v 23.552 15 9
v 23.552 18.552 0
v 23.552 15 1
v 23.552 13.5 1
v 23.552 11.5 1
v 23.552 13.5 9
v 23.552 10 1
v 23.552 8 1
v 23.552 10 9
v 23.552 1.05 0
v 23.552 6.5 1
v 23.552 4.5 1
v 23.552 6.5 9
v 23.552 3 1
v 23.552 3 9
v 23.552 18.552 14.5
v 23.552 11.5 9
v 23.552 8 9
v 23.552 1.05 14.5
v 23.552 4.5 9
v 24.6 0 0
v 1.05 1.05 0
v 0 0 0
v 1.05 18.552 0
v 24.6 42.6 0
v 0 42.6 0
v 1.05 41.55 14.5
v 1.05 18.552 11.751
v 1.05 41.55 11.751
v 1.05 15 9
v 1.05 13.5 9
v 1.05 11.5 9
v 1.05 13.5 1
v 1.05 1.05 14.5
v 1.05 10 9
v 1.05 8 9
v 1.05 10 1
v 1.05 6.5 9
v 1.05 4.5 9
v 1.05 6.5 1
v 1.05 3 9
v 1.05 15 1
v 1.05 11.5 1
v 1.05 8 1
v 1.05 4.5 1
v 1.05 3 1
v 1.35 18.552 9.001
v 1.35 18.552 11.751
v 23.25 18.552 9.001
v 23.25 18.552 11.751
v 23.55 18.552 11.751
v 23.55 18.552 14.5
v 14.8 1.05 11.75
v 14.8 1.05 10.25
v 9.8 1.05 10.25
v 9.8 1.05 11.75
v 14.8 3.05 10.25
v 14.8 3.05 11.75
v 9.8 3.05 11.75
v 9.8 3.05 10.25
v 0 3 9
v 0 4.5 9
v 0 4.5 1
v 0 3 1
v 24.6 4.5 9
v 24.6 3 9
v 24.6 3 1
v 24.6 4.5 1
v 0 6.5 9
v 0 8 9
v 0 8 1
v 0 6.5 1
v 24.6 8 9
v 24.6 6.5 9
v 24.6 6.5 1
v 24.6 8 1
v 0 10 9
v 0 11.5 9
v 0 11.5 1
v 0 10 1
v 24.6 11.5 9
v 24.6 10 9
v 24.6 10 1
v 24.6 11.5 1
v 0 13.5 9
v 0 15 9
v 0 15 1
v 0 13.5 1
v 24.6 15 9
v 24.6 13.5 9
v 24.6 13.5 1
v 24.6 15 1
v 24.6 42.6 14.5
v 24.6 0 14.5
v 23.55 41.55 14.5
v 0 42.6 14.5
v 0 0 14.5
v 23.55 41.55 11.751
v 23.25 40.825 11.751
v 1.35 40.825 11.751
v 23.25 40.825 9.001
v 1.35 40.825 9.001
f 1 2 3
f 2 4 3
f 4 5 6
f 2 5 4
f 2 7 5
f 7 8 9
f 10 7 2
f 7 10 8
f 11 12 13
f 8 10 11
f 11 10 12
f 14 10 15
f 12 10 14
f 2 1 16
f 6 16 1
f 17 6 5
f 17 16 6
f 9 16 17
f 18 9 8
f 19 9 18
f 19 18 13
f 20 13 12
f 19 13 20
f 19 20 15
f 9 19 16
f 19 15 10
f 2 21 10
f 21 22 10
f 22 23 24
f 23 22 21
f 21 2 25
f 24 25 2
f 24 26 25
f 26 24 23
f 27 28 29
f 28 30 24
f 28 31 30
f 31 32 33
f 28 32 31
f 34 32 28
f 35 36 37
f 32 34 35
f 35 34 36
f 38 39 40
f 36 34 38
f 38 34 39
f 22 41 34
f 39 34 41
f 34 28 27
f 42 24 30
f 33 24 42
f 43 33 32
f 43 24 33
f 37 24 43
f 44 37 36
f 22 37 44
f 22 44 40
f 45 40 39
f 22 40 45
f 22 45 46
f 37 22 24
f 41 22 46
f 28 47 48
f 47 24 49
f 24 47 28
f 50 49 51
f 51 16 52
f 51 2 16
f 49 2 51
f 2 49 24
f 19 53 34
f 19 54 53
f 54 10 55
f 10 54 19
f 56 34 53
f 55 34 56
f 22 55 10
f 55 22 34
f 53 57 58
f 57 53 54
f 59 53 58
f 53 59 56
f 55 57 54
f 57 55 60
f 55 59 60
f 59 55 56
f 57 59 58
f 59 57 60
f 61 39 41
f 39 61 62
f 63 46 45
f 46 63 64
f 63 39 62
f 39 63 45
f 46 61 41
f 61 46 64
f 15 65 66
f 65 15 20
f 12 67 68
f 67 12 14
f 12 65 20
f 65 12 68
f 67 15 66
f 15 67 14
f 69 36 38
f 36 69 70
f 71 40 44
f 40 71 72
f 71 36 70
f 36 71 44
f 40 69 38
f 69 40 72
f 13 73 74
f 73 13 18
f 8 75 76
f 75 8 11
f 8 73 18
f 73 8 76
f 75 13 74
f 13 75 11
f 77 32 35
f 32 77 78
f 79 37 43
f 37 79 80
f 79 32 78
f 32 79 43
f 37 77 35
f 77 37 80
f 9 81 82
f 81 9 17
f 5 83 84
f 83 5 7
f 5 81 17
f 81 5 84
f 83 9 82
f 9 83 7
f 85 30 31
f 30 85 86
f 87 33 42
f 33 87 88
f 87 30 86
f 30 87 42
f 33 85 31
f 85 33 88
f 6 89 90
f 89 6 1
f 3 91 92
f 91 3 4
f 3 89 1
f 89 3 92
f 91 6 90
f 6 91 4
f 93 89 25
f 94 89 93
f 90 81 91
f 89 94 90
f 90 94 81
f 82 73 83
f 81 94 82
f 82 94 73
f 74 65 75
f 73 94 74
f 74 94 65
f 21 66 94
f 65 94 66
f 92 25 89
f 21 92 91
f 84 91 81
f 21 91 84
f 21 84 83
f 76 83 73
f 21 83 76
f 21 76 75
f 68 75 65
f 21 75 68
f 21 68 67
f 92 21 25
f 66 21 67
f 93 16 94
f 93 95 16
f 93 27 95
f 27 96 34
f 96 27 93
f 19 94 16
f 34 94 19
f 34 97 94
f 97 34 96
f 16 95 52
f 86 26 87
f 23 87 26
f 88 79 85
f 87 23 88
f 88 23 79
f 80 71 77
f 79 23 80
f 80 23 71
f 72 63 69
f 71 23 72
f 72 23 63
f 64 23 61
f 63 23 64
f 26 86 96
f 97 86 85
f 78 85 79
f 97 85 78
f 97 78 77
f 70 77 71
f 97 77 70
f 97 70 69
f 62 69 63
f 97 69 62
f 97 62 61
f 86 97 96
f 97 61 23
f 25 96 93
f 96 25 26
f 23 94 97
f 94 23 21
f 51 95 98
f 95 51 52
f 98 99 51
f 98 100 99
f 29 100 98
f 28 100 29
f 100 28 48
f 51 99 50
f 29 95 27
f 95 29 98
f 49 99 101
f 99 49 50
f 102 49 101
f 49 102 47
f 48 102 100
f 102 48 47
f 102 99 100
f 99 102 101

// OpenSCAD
// remix of https://www.thingiverse.com/thing:2411898
// (C)Inhumierer June 30, 2017
// my credits for Inhumierer

// V 1.3 adaption to HB_TH_Sensor_SHT45_BME280_FUEL4EP by FUEL4EP 02/2024
// V 1.2 Correction / hint from molotok3D, some minor fixes
// V 1.1- added opening helper and an optional separating wall 

// IMPORTANT: Please adjust the variable 'gap' below to
// get a proper and not too tight fitting of the cover
// and the bottom box.
// The necessary adjustment may depend on your 3D
// printer's tolerances.

$fa = 0.05;
$fs=0.05;
wPCB=22.1;
lPCB=40.1;
b=2.1;       

wSensor=22.1;
lSensor=17.1;

gap_device=0.4;

wi=wPCB+b+gap_device; // 22.2 + 1.5 + 0.8 = 24.5	
li=lPCB+b+gap_device; // 40.2 + 1.5 + 0.8 = 42.5

e=0.01;

delta=0.001;


th_PCB=5.5;              // PCB thickness with assembled components
th_Sensor=3;             // PCB thickness with assembled components
h_pin_header=3;
d_Sensor=3;


h_PCB_holder=th_PCB+th_Sensor+h_pin_header+d_Sensor;
cutoutSensor=h_PCB_holder;

wNose=5;
hNose=1.5;
lNose=2;

show_PCB=false;           // set to true for checking purpose

// venting slits for sensor

n_slits=2;
h_slits=8;
zo_slits=1;
y_center_slits=10;
w_slits=1.5;
inc_slits=3.5;


module PCB_holder(x,y,z) {

  difference(){
    translate([x,y,z])rotate([0,0,0]) cube([wi,li,h_PCB_holder]);
    difference() {
          translate([x+b/2,y+b/2,z])rotate([0,0,0]) cube([wSensor+gap_device+2*delta,lSensor+gap_device+2*delta,cutoutSensor+2*delta]);
      rotate([0,0,0]) 
        translate([wi/2-wNose/2,b/2,cutoutSensor-th_PCB/2-hNose])
          cube([wNose,lNose,hNose]);
    }
    translate([x+b/2,y+b/2,z+h_PCB_holder-th_PCB/2+delta])rotate([0,0,0]) cube([wPCB+gap_device,lPCB+gap_device,th_PCB/2+2*delta]);
    translate([wi/2-wPCB/2-gap_device/2,lSensor+gap_device+b/2,cutoutSensor-th_PCB/2+delta]) rotate([0,0,0]) cube([wPCB+gap_device,lPCB-(lSensor+b/4),th_PCB/2]);
    #translate([wi/2-wPCB/2+gap_device/4,lSensor+gap_device+b/2,cutoutSensor-th_PCB+delta]) rotate([0,0,0]) cube([wPCB-gap_device/2,lPCB-(lSensor+b/4+gap_device/2),th_PCB/2]);
    
    
// venilation slits 
    translate([0,0,zo_slits]) { 
      for ( i=[-n_slits:1:n_slits-1] ){   
        translate([-delta,i*inc_slits+y_center_slits,0])
            cube([b/2+2*delta,w_slits,h_slits]);
        translate([wi-b/2-delta,i*inc_slits+y_center_slits,0])
            cube([b/2+2*delta,w_slits,h_slits]);
    
     }
   }
   
 }
 if (show_PCB==true) {
   d_device=0;  
   translate([x+b/2+gap_device/2,y+b/2+gap_device/2,z+h_PCB_holder-th_PCB+d_device])rotate([0,0,0]) cube([wPCB,lPCB,th_PCB]);
   translate([x+b/2+gap_device/2,y+b/2+gap_device/2,z+h_PCB_holder-th_PCB+d_device-h_pin_header-th_Sensor]) rotate([0,0,0]) cube([wSensor,lSensor,th_Sensor]);
  }
}

PCB_holder(0,0,0);
echo("width = ",wi);
echo("length = ",li);
echo("height = ",h_PCB_holder);
